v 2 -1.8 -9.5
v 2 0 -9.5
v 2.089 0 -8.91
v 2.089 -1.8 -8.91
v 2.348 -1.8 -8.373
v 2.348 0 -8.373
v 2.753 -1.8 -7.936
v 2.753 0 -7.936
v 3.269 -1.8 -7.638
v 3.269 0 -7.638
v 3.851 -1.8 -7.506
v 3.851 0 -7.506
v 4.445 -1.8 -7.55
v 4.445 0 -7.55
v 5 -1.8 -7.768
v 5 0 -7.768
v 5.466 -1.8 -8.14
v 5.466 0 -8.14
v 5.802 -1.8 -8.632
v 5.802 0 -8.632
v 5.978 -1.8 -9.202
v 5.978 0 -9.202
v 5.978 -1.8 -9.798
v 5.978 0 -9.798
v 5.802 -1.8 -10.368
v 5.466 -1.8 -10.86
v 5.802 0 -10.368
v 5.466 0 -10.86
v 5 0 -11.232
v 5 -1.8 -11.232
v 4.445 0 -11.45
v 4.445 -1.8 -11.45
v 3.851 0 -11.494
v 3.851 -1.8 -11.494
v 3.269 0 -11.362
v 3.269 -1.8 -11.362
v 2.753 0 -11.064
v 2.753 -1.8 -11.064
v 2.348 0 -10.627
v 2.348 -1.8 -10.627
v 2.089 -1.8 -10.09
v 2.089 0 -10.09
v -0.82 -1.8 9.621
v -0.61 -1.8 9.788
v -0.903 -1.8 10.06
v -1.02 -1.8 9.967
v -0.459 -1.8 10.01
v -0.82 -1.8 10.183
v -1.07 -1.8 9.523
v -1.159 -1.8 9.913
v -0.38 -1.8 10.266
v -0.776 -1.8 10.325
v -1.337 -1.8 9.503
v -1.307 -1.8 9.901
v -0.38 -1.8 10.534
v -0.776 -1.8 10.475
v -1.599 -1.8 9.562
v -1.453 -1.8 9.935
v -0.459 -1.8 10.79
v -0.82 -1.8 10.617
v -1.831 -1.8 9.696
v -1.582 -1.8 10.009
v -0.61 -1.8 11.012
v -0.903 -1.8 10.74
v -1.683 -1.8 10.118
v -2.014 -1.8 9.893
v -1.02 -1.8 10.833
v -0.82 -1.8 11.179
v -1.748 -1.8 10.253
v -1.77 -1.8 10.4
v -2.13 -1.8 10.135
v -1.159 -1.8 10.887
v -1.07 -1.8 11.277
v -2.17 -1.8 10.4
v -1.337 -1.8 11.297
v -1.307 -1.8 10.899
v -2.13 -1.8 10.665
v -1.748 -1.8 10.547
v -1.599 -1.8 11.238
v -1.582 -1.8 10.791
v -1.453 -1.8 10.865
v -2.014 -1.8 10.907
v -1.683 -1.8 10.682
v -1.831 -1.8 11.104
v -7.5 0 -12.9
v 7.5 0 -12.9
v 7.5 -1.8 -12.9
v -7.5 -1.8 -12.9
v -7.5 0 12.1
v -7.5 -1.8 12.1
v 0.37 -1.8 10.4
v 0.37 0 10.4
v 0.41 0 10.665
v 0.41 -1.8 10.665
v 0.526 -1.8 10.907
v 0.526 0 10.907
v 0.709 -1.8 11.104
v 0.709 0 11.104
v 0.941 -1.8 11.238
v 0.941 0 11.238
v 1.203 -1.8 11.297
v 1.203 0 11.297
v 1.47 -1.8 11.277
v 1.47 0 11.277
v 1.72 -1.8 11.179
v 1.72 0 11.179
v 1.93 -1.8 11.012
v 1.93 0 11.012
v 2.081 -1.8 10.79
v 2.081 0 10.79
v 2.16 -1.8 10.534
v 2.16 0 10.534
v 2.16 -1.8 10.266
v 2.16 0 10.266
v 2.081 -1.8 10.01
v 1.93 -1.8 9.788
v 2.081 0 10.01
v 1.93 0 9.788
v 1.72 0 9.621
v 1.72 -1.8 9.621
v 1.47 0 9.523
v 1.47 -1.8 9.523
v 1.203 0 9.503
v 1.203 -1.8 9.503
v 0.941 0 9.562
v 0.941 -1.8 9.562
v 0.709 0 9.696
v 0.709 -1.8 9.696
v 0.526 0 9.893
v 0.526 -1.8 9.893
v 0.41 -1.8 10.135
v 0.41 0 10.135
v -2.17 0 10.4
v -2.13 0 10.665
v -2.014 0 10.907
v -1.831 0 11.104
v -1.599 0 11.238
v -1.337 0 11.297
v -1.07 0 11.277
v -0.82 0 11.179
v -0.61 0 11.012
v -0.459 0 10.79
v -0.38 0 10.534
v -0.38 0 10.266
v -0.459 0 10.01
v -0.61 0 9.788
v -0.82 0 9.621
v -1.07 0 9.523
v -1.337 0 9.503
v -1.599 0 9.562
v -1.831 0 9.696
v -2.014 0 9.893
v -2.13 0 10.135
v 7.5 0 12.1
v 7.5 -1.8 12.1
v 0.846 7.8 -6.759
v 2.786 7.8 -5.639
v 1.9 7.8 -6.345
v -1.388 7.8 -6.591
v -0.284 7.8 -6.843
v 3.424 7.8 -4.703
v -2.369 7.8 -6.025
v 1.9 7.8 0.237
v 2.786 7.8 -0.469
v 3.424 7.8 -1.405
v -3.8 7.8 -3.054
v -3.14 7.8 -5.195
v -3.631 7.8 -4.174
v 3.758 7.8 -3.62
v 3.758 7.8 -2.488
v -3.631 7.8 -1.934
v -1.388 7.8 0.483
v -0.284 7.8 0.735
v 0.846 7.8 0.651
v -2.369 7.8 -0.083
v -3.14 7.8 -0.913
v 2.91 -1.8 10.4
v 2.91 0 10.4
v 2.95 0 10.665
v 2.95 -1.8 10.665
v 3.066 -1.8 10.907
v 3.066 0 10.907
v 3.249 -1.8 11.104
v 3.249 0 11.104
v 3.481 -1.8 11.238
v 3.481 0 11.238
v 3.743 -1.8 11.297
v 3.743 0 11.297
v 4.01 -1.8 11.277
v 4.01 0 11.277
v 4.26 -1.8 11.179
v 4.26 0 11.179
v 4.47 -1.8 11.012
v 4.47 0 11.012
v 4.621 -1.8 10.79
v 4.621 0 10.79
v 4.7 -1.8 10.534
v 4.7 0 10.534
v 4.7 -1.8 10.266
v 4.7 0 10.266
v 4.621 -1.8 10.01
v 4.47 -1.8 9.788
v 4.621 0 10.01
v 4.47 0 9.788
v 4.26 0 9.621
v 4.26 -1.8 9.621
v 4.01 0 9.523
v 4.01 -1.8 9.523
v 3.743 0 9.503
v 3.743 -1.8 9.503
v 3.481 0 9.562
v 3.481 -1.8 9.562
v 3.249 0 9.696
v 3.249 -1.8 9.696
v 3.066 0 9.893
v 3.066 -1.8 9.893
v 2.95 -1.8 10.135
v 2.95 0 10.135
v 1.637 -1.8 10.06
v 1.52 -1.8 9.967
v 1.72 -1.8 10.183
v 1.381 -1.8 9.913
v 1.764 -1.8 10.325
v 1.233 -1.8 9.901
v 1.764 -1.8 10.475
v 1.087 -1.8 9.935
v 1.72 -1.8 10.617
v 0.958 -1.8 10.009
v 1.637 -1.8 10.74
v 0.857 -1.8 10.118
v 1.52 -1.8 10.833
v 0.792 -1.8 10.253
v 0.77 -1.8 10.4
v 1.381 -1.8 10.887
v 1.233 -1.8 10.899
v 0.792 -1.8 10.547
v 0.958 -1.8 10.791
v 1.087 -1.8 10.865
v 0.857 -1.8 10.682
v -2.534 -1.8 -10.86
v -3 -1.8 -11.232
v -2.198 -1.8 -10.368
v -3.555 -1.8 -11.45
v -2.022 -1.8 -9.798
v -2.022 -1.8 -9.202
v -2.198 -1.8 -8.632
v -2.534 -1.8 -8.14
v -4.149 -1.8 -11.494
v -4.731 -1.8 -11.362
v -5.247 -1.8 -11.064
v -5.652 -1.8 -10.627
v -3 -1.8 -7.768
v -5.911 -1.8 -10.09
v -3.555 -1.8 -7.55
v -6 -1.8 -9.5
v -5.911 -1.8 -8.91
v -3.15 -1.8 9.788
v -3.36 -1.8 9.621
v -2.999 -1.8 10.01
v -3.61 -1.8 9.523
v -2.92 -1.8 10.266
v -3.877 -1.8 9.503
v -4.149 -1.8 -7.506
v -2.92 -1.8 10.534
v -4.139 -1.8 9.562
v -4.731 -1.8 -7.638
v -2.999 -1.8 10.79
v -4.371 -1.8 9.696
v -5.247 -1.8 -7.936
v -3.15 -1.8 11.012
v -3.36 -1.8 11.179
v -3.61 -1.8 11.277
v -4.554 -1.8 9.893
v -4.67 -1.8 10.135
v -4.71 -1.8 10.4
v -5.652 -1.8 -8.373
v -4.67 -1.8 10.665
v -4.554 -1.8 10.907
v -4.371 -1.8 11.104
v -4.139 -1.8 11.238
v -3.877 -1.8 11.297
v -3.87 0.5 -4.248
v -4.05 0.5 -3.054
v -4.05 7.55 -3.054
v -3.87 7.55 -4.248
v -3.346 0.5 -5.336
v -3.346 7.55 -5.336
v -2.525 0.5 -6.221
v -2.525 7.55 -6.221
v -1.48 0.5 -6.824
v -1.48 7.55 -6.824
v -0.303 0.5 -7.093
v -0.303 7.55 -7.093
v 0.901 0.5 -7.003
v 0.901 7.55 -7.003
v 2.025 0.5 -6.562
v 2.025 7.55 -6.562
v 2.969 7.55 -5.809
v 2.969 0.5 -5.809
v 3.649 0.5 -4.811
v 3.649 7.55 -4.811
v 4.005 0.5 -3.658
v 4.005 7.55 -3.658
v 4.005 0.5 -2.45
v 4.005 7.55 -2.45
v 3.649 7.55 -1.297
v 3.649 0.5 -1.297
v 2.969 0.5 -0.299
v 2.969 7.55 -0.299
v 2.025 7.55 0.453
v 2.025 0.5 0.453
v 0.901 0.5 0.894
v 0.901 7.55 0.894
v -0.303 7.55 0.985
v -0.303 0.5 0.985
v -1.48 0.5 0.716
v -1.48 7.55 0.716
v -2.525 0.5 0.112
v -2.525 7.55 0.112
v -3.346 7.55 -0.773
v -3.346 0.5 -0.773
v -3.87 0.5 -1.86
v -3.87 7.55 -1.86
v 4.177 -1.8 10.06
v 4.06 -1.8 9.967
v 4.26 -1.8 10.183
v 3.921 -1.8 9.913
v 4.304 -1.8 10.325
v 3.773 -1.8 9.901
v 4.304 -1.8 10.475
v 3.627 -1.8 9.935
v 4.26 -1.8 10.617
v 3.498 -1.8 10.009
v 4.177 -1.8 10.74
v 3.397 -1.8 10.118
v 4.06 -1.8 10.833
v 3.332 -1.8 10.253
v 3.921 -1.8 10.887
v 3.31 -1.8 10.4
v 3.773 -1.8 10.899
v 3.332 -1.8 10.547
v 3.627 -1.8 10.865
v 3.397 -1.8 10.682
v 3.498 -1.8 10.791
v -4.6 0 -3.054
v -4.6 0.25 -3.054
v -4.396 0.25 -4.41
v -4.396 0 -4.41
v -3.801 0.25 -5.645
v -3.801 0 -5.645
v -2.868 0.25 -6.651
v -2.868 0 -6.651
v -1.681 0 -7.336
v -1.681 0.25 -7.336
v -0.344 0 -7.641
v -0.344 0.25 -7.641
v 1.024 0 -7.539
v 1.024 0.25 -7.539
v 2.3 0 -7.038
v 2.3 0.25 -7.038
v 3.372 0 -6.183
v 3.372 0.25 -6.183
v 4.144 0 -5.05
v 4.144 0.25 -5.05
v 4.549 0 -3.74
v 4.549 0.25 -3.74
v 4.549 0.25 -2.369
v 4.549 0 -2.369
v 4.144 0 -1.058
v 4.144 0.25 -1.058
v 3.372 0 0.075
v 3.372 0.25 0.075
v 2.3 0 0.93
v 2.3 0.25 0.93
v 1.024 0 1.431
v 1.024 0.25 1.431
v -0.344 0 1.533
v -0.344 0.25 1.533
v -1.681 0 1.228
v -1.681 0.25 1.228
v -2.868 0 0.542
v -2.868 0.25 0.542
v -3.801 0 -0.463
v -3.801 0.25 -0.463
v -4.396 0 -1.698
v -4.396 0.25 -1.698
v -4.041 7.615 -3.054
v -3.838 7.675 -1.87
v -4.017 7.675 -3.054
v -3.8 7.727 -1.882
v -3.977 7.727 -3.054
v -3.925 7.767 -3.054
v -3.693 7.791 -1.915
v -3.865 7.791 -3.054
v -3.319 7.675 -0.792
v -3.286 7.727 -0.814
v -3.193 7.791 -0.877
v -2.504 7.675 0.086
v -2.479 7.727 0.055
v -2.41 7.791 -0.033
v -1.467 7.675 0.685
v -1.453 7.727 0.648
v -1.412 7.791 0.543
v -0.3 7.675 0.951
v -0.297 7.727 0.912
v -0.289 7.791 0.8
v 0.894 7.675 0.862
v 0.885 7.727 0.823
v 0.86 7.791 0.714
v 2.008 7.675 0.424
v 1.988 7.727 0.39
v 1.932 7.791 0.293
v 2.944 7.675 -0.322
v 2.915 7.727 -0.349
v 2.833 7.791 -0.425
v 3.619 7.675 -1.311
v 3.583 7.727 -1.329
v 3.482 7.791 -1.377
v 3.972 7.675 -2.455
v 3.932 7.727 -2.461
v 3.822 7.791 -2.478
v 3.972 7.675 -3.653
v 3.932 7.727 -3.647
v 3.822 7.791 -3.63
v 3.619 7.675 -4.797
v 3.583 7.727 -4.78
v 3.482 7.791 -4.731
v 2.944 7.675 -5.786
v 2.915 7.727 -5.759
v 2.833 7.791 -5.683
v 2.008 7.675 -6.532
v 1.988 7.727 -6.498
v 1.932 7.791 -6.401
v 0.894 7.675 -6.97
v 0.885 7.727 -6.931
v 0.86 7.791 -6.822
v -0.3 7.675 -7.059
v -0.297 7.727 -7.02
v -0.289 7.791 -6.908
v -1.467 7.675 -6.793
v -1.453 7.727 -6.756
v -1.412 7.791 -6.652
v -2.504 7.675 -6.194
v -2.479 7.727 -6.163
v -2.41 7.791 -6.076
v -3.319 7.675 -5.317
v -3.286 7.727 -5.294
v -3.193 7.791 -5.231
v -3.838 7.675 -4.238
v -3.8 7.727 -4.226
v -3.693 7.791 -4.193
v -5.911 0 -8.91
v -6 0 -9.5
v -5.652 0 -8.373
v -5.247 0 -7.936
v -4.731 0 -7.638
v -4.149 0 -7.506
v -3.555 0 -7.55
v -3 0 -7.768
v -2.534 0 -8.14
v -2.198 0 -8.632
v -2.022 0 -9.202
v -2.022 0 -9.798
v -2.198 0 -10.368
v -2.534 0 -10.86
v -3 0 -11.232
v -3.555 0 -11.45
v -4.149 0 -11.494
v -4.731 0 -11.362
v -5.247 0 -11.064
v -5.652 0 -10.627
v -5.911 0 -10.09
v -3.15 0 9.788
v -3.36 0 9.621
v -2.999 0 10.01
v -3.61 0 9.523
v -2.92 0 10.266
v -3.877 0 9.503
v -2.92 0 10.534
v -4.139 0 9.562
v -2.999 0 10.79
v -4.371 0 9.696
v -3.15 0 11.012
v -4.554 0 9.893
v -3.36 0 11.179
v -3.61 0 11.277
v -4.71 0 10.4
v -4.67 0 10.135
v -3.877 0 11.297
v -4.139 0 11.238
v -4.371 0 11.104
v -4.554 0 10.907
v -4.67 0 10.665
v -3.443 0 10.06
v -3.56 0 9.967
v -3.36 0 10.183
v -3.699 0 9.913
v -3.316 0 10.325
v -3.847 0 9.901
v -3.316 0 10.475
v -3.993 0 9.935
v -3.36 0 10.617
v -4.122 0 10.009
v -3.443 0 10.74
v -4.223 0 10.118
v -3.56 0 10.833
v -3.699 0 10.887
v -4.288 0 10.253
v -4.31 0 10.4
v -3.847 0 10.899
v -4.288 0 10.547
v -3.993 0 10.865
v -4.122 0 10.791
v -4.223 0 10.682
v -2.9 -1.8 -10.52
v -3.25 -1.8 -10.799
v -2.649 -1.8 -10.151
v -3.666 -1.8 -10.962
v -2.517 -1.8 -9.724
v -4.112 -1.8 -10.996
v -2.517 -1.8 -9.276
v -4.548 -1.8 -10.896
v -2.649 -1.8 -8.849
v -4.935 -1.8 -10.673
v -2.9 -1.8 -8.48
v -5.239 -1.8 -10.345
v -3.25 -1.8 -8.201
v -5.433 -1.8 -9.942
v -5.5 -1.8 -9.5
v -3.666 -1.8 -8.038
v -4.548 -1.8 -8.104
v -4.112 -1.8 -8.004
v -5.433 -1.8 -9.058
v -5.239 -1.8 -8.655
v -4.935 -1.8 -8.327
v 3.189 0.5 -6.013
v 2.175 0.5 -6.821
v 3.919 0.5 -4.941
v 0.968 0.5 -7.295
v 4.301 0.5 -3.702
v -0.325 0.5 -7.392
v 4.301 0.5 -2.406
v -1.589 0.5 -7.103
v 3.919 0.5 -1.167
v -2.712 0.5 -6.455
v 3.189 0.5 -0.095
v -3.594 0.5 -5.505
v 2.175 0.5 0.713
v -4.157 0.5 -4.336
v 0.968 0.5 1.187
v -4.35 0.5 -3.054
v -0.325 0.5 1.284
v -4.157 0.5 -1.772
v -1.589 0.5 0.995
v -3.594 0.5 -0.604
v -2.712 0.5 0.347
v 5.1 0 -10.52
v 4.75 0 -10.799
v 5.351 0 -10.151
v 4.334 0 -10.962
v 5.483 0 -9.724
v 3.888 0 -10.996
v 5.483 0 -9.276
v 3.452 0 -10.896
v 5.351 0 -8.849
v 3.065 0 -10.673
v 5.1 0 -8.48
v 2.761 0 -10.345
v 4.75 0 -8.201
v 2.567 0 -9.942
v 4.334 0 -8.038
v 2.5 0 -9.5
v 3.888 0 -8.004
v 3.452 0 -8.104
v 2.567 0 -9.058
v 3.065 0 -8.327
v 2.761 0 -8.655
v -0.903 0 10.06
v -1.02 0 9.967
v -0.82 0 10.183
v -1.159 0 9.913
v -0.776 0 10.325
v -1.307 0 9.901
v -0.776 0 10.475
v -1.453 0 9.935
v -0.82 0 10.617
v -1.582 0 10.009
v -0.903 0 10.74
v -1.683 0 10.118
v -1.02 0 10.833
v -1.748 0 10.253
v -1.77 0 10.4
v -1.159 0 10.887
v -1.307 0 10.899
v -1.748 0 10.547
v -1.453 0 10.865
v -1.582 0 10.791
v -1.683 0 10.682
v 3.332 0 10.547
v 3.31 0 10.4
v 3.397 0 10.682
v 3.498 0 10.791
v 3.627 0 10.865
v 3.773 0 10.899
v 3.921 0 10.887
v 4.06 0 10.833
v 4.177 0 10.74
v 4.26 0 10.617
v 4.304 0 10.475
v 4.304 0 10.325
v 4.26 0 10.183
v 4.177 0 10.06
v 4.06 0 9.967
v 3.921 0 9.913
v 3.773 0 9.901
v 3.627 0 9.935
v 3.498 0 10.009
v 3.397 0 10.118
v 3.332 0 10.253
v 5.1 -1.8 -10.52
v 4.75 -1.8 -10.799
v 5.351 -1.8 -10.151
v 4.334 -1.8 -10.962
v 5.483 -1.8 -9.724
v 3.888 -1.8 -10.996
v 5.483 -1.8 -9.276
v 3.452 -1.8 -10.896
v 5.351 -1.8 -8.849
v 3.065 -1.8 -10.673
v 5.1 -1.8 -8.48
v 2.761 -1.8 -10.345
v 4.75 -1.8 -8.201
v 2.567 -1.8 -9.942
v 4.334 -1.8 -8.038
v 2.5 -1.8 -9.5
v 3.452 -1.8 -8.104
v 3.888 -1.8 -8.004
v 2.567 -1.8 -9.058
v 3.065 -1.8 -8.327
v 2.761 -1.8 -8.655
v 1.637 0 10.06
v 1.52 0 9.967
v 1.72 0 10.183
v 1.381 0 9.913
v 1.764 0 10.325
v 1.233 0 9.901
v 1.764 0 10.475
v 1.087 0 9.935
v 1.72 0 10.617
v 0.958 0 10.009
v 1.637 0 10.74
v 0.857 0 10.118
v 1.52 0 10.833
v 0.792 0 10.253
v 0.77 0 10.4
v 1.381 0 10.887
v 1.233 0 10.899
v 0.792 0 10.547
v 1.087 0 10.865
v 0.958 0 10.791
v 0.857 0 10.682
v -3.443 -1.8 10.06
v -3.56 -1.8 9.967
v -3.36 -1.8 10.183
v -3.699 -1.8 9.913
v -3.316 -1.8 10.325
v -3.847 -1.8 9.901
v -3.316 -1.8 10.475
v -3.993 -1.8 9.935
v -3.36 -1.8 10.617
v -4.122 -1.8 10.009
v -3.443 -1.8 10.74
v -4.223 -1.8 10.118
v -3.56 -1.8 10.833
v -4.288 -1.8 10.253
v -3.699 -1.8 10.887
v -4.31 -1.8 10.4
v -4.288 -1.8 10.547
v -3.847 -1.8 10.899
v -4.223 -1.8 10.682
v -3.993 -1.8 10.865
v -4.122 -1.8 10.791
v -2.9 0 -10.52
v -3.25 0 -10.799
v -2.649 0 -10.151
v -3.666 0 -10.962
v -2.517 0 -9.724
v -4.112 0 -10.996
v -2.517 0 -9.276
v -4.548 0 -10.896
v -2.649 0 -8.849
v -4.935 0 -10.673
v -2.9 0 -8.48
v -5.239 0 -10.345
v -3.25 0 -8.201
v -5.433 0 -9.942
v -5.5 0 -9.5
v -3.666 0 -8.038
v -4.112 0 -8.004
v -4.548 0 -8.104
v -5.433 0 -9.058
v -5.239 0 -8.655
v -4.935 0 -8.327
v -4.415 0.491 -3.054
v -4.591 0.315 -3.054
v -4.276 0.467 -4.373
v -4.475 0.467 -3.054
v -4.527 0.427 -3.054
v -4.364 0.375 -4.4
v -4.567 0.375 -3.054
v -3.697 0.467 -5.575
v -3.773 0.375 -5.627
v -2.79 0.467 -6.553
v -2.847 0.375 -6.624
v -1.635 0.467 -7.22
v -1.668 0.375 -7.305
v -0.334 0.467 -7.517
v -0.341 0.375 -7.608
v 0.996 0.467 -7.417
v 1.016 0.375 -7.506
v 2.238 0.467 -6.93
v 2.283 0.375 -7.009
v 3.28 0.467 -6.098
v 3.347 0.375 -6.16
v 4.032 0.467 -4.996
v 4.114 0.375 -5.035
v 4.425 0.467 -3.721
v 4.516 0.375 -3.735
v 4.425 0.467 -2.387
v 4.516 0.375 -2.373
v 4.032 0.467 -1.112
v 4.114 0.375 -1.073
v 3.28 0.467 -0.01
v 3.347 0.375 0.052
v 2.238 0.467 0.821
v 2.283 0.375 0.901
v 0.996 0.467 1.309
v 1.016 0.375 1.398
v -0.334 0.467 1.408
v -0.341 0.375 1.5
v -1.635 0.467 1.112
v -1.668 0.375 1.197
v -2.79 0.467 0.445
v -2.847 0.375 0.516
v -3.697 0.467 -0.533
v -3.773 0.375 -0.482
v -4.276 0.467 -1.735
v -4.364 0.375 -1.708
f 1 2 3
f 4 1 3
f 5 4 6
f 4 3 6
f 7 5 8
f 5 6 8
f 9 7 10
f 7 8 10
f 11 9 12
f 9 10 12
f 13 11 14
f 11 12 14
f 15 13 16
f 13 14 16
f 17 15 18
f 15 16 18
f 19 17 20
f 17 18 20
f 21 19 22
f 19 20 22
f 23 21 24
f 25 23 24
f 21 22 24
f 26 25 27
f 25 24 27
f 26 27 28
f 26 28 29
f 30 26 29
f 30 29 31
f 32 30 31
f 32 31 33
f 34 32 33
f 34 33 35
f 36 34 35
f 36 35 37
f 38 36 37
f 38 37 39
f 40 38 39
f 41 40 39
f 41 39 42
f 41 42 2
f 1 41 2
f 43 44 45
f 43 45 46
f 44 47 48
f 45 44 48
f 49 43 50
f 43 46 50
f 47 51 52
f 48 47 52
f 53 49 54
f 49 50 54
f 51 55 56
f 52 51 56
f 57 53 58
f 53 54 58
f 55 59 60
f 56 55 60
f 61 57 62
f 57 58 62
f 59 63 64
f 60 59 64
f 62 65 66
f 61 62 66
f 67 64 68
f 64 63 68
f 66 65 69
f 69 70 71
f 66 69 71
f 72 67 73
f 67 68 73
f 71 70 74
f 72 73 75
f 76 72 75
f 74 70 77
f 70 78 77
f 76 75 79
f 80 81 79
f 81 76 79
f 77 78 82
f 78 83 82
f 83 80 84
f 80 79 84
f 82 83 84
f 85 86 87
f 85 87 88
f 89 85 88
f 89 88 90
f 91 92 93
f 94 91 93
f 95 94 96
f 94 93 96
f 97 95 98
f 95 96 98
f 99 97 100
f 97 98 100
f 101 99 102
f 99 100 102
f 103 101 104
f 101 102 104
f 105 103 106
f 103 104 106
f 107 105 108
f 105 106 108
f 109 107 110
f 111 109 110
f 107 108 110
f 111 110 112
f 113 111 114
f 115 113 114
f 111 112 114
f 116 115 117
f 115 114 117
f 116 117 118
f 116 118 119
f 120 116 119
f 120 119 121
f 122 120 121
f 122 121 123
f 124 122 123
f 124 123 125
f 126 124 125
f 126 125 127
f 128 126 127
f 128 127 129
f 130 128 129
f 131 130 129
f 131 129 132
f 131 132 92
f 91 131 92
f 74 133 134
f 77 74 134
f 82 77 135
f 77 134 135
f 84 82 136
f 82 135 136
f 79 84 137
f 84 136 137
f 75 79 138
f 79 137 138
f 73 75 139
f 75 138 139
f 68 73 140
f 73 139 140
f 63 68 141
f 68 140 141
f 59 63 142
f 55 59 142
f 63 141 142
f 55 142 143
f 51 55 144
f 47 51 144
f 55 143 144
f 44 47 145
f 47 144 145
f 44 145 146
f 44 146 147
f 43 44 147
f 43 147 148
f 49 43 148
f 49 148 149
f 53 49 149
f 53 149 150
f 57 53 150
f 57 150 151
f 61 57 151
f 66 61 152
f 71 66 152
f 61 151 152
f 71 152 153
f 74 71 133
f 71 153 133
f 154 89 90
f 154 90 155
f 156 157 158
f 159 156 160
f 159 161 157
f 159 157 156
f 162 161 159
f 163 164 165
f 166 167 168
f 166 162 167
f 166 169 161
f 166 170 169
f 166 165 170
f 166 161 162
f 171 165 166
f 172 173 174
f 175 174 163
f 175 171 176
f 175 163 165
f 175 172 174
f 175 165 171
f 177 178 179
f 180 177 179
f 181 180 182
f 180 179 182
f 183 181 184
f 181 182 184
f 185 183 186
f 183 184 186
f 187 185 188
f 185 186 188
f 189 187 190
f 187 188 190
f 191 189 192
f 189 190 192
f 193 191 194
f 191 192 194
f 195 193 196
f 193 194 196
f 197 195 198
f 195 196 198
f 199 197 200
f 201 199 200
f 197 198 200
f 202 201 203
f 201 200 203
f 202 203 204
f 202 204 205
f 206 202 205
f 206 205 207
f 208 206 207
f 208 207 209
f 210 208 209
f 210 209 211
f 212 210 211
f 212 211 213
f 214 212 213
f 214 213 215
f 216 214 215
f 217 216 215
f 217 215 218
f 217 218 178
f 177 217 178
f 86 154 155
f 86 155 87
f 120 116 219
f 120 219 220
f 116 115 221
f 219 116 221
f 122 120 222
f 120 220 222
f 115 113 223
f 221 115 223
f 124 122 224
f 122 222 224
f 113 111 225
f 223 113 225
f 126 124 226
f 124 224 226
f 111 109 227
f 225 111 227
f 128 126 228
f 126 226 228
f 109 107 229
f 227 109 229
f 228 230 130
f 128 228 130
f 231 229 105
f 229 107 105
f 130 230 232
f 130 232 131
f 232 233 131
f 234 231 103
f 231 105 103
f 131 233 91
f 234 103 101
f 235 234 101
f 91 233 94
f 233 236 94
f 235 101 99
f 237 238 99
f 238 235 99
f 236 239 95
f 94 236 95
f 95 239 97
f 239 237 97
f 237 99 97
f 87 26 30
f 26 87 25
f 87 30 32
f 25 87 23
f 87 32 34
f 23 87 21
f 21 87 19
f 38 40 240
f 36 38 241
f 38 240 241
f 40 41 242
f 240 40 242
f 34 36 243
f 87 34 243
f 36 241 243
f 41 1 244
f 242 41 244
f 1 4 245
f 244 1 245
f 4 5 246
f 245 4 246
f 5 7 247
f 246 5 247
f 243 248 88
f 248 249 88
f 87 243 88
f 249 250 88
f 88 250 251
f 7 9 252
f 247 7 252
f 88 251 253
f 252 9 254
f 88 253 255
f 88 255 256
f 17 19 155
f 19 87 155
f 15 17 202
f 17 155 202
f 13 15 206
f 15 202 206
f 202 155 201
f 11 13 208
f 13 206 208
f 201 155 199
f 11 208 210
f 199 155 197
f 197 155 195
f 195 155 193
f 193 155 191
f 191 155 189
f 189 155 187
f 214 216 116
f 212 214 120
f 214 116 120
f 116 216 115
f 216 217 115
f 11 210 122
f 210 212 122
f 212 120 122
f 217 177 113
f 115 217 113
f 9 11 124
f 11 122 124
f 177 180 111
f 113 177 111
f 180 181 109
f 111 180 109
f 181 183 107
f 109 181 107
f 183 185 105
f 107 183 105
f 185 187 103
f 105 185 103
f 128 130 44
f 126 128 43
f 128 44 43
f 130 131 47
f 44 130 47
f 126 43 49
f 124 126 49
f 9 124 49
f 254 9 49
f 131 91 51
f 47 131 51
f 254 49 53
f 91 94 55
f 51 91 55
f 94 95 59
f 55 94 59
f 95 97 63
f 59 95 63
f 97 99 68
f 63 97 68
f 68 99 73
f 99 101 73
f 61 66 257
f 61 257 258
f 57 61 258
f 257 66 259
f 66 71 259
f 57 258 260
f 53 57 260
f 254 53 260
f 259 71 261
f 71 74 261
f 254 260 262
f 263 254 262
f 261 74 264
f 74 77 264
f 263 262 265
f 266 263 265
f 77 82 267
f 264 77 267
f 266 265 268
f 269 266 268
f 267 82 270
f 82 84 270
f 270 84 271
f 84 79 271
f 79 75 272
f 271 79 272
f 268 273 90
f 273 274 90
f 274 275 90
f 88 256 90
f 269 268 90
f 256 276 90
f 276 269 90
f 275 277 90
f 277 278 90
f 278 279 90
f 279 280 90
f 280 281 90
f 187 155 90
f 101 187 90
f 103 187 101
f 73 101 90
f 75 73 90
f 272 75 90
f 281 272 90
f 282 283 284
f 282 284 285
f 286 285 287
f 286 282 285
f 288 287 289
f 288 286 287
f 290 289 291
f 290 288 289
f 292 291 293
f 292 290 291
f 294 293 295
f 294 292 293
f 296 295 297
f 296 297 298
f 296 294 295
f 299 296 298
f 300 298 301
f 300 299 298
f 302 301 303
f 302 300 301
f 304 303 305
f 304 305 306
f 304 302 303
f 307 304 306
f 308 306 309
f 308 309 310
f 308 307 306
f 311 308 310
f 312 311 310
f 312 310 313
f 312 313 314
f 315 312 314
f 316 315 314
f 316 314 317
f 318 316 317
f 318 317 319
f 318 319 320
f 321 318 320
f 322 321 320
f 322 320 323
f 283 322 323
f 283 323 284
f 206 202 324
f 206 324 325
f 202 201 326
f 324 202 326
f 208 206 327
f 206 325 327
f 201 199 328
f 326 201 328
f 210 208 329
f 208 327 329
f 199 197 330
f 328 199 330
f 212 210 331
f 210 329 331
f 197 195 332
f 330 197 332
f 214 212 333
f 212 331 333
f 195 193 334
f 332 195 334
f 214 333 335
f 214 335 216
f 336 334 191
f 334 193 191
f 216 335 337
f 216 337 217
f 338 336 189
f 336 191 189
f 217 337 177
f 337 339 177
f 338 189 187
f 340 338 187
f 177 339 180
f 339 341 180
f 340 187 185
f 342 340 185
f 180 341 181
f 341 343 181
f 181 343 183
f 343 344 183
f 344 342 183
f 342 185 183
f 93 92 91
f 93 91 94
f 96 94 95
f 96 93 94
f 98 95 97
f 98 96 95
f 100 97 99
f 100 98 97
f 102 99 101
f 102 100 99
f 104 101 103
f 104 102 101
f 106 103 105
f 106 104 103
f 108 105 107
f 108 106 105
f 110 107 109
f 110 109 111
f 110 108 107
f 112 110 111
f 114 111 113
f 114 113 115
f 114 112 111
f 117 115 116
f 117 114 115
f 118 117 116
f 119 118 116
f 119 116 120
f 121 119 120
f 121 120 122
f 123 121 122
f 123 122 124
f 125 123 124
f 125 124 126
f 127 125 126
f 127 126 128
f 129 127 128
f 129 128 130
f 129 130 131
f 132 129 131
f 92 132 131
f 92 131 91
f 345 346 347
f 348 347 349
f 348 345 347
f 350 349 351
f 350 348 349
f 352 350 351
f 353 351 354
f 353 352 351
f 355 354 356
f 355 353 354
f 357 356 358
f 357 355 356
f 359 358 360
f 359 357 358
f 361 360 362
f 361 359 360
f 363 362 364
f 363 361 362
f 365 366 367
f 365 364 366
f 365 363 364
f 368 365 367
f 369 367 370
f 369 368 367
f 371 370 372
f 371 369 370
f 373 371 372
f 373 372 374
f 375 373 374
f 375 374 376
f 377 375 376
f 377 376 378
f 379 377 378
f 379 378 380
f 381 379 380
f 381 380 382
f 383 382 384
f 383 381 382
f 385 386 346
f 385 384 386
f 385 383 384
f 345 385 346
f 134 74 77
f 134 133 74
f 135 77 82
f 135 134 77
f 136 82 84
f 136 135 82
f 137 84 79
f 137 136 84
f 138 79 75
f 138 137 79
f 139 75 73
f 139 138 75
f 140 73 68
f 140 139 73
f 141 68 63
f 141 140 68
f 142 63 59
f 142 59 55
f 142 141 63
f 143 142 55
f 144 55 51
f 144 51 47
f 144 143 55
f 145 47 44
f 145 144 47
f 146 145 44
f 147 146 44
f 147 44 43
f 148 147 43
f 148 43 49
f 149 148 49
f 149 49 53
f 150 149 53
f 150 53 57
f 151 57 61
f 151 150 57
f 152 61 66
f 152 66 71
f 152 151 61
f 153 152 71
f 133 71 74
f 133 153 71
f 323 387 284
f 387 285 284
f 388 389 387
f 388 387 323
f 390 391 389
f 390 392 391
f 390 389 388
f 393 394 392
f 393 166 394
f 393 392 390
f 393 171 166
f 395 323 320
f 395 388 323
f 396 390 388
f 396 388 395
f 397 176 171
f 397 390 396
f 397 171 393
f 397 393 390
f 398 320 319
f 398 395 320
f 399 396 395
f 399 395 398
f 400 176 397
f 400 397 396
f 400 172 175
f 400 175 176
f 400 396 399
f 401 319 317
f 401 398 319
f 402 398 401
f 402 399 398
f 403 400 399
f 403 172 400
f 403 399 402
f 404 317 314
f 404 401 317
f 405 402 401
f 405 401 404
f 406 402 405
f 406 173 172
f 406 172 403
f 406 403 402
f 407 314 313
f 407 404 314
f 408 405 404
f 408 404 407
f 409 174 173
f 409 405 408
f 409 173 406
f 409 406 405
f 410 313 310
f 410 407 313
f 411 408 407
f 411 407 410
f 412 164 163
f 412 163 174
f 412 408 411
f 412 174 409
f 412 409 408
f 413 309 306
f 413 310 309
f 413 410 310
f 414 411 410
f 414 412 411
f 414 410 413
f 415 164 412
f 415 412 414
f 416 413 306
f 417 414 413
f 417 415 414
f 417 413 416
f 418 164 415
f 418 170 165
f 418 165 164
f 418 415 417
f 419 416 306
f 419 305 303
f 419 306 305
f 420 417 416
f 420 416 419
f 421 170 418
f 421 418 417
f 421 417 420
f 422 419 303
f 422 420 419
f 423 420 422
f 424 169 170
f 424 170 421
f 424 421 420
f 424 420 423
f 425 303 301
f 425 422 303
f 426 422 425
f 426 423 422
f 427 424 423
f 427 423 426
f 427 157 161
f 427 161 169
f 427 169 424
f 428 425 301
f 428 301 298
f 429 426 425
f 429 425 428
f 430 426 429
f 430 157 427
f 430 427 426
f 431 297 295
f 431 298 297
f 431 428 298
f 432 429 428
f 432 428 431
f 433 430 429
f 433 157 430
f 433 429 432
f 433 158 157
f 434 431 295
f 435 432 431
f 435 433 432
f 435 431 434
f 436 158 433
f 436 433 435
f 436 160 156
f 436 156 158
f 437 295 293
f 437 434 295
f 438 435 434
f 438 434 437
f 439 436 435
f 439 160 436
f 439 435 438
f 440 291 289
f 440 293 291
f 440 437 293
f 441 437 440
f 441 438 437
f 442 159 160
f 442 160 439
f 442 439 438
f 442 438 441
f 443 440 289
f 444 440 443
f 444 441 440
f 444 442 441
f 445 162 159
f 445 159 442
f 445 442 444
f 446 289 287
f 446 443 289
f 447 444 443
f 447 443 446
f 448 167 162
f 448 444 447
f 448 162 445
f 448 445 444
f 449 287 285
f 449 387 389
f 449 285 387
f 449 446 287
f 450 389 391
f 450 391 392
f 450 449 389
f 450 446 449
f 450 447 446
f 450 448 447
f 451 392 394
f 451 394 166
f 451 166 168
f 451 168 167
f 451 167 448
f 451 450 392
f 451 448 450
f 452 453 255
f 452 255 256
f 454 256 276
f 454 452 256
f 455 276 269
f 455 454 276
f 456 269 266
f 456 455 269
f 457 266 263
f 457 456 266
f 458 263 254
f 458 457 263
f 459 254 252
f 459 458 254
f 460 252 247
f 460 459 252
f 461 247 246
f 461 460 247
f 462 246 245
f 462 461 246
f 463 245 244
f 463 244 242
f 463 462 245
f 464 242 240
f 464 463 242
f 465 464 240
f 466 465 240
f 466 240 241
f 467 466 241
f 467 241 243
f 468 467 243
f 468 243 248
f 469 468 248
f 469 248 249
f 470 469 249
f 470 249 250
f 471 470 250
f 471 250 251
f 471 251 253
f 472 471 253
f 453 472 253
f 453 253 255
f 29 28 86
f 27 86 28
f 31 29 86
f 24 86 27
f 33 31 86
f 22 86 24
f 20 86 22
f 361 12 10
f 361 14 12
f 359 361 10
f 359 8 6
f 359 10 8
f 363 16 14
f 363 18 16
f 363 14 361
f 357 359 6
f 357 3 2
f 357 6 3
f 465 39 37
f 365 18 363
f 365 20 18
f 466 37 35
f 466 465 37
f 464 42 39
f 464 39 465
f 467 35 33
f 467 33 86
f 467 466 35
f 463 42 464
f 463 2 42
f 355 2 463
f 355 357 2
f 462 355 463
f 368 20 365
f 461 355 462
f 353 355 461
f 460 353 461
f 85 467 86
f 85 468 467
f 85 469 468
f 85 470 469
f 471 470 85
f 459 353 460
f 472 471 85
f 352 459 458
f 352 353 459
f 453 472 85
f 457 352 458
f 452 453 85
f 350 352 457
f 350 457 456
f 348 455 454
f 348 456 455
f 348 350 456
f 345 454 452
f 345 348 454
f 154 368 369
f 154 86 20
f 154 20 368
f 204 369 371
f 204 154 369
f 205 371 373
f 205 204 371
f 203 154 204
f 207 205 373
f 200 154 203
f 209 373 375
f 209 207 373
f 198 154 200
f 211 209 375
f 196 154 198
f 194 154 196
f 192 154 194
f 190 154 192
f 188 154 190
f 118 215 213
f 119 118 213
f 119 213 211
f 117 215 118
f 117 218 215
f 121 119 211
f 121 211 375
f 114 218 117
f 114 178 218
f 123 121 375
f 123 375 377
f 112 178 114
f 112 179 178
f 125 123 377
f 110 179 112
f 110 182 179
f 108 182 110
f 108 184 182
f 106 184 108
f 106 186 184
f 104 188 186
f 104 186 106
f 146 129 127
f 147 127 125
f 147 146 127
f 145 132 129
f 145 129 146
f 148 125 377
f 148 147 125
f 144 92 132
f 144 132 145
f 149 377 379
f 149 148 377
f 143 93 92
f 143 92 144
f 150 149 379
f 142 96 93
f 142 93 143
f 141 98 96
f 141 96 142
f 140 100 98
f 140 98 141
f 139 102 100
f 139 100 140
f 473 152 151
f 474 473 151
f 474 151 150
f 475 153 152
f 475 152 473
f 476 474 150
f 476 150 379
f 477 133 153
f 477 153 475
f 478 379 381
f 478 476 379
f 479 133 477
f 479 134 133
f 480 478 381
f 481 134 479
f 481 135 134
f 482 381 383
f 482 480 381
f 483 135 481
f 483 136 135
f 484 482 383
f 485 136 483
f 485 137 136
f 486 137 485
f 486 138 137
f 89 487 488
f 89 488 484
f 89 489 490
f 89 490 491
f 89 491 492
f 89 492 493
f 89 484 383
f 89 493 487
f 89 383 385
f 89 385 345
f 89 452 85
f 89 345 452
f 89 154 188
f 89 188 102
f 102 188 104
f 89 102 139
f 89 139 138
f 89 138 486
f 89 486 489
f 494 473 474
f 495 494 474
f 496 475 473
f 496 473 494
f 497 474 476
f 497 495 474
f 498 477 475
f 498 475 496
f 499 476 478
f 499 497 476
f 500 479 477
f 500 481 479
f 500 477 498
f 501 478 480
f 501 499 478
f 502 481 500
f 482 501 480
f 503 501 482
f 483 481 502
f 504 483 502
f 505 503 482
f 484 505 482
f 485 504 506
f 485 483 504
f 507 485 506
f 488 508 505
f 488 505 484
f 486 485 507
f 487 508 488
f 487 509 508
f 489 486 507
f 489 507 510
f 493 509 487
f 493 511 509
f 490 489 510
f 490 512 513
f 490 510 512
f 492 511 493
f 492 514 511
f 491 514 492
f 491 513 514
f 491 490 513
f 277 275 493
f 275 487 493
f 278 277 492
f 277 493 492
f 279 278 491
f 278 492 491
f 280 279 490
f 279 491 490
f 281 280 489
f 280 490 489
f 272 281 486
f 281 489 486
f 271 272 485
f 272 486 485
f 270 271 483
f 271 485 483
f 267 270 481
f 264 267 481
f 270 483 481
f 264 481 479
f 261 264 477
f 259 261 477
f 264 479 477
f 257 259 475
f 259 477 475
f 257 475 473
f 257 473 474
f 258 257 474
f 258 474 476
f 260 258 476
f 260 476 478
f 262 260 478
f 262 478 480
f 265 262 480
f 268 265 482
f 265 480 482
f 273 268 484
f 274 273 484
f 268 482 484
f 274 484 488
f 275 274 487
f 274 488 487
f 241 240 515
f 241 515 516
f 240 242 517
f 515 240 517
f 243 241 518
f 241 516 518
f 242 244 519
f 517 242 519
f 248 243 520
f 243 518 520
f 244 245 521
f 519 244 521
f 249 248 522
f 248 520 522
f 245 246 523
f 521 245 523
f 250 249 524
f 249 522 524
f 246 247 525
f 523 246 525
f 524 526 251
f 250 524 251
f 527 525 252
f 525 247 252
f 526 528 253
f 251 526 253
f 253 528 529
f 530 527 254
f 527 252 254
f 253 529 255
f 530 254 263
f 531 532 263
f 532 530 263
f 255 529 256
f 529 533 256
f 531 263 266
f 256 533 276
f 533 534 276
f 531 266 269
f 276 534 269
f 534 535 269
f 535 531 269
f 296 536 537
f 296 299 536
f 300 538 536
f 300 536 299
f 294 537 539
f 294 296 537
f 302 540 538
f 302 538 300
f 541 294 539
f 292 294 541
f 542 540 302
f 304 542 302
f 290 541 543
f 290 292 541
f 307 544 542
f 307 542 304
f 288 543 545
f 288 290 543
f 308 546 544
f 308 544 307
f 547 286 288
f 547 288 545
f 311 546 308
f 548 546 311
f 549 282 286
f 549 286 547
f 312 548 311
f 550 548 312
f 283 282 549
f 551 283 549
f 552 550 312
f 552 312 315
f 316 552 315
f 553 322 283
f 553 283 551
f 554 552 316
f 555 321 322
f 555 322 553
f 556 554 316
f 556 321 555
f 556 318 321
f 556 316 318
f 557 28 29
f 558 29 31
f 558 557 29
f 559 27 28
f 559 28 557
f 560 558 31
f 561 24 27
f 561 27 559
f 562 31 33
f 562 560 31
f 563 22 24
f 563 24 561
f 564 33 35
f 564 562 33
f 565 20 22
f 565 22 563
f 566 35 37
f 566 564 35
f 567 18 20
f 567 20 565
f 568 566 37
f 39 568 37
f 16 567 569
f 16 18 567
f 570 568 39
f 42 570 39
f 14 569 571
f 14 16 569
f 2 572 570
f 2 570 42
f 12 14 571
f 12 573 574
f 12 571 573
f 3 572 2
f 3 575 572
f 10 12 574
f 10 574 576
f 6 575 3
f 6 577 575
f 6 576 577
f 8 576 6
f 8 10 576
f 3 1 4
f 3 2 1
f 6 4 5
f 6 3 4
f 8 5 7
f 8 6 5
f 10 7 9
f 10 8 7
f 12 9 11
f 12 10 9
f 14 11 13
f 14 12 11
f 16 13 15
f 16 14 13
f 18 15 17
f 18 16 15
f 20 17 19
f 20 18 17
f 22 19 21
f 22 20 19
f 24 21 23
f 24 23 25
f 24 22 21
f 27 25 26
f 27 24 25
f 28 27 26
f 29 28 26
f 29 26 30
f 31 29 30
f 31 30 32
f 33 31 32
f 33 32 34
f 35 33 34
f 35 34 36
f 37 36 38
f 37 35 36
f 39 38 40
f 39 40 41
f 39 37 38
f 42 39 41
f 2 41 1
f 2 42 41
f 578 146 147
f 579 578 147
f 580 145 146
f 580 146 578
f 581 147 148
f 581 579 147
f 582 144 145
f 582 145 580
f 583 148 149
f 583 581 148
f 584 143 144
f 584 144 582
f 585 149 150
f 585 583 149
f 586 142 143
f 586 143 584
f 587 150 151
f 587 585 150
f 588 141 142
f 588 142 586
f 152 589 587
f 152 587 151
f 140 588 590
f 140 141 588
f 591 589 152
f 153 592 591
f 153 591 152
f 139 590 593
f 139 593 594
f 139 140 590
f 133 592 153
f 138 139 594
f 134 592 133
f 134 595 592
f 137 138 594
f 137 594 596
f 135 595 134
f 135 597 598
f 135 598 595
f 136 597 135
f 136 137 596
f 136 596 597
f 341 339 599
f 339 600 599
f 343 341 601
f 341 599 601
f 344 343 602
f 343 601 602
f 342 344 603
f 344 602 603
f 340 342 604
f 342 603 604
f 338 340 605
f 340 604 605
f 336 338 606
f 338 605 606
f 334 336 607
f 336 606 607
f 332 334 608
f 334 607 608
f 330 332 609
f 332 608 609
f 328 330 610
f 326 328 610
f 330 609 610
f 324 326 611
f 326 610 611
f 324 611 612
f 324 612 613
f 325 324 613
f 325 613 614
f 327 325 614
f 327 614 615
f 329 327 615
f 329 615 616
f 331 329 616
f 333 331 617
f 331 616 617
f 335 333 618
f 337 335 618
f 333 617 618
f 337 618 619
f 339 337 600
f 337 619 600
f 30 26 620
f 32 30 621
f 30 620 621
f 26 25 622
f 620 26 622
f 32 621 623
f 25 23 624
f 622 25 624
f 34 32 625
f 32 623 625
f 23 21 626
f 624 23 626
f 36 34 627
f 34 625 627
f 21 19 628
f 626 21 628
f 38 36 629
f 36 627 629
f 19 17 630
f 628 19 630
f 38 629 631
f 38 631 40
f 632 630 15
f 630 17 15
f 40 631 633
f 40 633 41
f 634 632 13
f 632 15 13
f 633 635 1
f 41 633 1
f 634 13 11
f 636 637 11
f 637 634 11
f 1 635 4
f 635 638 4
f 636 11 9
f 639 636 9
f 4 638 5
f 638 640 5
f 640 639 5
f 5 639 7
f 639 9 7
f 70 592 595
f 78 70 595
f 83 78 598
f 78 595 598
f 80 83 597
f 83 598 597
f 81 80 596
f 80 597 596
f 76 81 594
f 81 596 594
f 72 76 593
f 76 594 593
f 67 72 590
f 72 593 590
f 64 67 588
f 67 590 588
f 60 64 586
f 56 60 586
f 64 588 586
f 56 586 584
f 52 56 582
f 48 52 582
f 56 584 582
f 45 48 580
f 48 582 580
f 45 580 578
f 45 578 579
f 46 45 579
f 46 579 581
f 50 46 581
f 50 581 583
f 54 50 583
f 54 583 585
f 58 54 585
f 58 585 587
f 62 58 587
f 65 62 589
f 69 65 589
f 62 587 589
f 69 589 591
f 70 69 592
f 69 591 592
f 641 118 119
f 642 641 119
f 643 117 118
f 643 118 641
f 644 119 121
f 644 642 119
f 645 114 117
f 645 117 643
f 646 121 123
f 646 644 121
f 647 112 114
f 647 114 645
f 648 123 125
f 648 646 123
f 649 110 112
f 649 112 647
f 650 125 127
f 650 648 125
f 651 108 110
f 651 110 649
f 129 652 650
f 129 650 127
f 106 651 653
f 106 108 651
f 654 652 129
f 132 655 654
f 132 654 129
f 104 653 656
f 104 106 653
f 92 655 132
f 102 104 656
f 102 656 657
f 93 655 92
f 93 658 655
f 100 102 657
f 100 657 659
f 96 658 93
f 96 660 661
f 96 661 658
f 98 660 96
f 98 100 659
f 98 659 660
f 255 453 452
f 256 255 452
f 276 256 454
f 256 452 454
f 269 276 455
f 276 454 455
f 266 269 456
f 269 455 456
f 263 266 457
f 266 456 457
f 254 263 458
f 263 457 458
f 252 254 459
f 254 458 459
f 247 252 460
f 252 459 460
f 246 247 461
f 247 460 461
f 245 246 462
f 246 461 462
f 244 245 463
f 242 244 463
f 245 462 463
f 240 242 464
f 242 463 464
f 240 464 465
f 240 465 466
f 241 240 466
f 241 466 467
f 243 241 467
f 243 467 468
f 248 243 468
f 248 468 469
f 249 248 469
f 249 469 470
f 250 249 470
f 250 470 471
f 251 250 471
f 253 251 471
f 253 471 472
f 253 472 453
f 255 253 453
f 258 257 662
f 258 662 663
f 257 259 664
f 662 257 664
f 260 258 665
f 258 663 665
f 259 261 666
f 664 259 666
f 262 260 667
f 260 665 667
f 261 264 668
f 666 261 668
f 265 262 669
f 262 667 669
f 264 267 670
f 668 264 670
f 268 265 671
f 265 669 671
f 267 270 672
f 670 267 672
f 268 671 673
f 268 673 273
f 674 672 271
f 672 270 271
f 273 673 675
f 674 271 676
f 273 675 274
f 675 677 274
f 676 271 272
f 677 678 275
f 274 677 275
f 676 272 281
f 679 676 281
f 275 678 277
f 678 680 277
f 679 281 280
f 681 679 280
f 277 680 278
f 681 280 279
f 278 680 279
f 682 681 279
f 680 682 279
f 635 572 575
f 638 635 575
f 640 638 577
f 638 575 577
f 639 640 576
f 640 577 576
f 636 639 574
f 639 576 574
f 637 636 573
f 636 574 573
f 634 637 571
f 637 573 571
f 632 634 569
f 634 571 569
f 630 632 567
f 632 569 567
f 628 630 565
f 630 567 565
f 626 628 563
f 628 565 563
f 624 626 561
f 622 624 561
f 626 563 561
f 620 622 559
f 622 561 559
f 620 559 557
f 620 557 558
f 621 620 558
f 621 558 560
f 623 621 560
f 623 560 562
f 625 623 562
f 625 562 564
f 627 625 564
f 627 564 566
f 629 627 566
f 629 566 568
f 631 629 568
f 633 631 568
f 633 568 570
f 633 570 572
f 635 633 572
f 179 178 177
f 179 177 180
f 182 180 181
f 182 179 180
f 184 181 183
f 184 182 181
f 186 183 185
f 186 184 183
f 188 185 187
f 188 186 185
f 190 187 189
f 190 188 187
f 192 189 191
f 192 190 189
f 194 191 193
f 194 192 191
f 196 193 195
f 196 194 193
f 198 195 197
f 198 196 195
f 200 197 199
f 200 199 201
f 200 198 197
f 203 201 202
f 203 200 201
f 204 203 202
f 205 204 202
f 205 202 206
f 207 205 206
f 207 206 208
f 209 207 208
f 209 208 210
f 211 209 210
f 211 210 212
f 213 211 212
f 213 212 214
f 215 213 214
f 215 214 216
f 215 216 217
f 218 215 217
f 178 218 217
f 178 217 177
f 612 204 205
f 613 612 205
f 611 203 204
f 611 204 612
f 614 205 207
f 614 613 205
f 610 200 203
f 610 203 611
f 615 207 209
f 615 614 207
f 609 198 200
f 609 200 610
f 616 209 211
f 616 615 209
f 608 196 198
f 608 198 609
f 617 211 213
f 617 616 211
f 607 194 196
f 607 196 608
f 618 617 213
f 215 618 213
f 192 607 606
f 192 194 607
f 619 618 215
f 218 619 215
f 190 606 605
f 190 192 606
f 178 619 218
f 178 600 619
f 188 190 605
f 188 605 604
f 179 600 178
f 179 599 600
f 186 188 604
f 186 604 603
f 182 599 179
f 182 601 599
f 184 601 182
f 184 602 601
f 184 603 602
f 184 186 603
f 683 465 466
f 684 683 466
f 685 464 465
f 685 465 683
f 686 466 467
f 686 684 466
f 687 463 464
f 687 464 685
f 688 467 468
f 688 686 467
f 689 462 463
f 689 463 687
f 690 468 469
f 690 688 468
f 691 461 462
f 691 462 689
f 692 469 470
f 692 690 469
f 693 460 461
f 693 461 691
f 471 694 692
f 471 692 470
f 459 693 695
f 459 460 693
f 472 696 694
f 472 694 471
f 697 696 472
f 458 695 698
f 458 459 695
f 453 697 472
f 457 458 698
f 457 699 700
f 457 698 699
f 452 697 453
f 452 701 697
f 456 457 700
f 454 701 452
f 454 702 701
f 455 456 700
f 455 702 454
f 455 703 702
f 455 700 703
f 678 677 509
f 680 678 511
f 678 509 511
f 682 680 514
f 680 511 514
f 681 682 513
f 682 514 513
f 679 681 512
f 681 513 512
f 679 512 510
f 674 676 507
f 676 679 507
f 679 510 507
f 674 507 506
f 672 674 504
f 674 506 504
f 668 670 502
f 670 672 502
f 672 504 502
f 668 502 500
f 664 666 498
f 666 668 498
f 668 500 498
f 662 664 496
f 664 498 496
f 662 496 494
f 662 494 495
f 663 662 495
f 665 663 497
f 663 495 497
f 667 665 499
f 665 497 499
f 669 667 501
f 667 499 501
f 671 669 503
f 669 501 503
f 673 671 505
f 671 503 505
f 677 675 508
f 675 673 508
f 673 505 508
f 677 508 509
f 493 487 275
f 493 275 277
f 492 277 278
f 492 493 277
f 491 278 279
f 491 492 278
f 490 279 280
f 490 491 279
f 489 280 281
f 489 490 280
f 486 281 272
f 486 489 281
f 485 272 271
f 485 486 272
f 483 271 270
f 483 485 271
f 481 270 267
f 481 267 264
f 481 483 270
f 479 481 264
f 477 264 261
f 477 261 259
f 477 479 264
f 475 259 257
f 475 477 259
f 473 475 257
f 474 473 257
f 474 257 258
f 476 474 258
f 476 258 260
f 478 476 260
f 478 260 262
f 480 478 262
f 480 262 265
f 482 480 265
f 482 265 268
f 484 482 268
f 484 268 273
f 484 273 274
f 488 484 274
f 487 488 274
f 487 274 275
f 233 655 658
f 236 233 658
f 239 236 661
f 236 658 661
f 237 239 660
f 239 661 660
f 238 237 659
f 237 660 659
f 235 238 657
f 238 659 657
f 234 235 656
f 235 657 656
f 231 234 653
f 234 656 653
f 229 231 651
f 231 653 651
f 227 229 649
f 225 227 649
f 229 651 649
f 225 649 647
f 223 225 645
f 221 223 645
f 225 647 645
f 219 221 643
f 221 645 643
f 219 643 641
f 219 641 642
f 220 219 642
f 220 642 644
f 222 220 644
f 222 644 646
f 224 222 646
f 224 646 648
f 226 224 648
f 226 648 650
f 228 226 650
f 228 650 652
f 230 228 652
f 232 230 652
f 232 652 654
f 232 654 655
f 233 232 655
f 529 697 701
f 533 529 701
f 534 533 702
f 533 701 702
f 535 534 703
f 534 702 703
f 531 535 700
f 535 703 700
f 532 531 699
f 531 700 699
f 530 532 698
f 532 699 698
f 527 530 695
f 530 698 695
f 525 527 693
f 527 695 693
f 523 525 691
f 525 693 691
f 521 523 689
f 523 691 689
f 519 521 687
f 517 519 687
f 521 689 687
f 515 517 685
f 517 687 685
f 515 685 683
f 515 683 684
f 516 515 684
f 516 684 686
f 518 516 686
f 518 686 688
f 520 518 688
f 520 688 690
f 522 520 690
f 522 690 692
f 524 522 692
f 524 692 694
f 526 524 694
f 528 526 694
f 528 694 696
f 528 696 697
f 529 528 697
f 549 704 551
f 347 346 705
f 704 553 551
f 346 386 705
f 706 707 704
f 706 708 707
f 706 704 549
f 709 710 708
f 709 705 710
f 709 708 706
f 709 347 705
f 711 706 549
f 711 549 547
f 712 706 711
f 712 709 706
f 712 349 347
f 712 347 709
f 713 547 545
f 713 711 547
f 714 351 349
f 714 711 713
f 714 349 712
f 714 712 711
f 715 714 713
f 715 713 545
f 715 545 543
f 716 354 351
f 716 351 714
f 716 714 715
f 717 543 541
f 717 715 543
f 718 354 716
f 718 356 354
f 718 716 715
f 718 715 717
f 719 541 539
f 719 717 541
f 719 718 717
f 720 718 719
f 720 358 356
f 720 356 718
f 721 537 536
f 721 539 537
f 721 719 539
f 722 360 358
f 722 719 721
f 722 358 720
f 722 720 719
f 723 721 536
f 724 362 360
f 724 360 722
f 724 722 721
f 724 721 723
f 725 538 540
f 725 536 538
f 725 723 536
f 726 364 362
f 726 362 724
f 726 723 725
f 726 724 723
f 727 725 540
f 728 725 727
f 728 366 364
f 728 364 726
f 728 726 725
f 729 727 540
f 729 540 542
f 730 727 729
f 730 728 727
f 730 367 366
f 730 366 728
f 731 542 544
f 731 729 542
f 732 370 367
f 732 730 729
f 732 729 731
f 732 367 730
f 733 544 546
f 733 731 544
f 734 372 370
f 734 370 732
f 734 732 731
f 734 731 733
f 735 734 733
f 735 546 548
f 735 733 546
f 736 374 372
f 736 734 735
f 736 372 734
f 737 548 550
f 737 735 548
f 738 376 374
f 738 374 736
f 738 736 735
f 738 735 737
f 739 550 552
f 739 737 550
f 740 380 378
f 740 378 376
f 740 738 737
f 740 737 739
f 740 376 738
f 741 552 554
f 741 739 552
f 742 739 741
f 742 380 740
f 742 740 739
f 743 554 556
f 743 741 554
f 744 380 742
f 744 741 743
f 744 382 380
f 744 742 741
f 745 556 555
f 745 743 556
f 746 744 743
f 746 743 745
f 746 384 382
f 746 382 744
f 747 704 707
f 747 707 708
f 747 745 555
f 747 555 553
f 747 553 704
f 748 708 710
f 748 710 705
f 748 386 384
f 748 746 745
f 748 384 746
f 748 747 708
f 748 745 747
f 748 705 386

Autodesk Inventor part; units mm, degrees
ref_plane "YZ Plane" through (0, 0, 0) normal (1, 0, 0) x (0, 1, 0)
ref_plane "XZ Plane" through (0, 0, 0) normal (0, 1, 0) x (-1, 0, 0)
ref_plane "XY Plane" through (0, 0, 0) normal (0, 0, 1) x (1, 0, 0)
sketch "Sketch1" plane through (0, 0, 0) normal (0, 1, 0) x (-1, 0, 0)
  line L0 (7.5, 12.1) -> (-7.5, 12.1)
  line L1 (-7.5, 12.1) -> (-7.5, -12.9)
  line L2 (-7.5, -12.9) -> (7.5, -12.9)
  line L3 (7.5, -12.9) -> (7.5, 12.1)
  circle A0 centre (0, -3.0541) radius 4.05
  circle A1 centre (0, -3.0541) radius 4.6
  circle A2 centre (4, -9.5) radius 1.5
  line L4 (7.5, -12.9) -> (4, -12.9)
  circle A3 centre (-4, -9.5) radius 1.5
  circle A4 centre (4, -9.5) radius 2
  circle A5 centre (-4, -9.5) radius 2
  line L5 (0, -3.0541) -> (7.5, -3.0541)
  line L6 (7.5, -3.0541) -> (7.5, -12.9)
  line L7 (7.5, -12.9) -> (0, -12.9)
  line L8 (0, -12.9) -> (0, -3.0541)
  line L9 (8.662, 14.258) -> (8.662, -14.1579) construction
  line L10 (8.662, -14.1579) -> (-25.9569, -14.1579) construction
  line L11 (-25.9569, -14.1579) -> (-25.9569, 14.258) construction
  line L12 (-25.9569, 14.258) -> (8.662, 14.258) construction
  line L13 (0, -3.0541) -> (0, 12.1)
  line L14 (0, 12.1) -> (0, 10.4)
  line L15 (0, 10.4) -> (1.27, 10.4)
  line L16 (1.27, 10.4) -> (3.81, 10.4)
  line L17 (0, 10.4) -> (-1.27, 10.4)
  line L18 (-1.27, 10.4) -> (-3.81, 10.4)
  circle A6 centre (1.27, 10.4) radius 0.5
  circle A7 centre (3.81, 10.4) radius 0.5
  circle A8 centre (3.81, 10.4) radius 0.9
  circle A9 centre (1.27, 10.4) radius 0.9
  circle A10 centre (-1.27, 10.4) radius 0.9
  circle A11 centre (-3.81, 10.4) radius 0.9
  circle A12 centre (-1.27, 10.4) radius 0.5
  circle A13 centre (-3.81, 10.4) radius 0.5
  point P0 (0, 0)
  dimension "d0" = 15
  dimension "d1" = 25
  dimension "d64" = 8.1
  dimension "d68" = 9.2
  dimension "d73" = 3
  dimension "d83" = 3
  dimension "d99" = 0.5
  dimension "d100" = 0.5
  dimension "d113" = 9.846
  dimension "d114" = 3.5
  dimension "d115" = 3.4
  dimension "d143" = 1.7
  dimension "d144" = 1.27
  dimension "d145" = 2.54
  dimension "d146" = 1.27
  dimension "d147" = 2.54
  dimension "d148" = 1
  dimension "d149" = 1
  dimension "d150" = 1.8
  dimension "d151" = 1.8
  dimension "d152" = 1.8
  dimension "d153" = 1.8
  dimension "d154" = 1
  dimension "d155" = 1
extrude "Extrusion1" add sketch "Sketch1" against normal blind 1.8 contours L3 L5 A1 L13 L0 | L13 A1 L8 L2 L1 L0 | L3 L2 L8 A1 L5 | L5 A0 L13 A1 | A1 L8 A0 L5 | L13 A0 L8 A1 | L5 L13 A0 | A0 L8 L5 | L13 L8 A0 | A2 | A3 | A4 | A5 | A9 L16 A6 L15 | L15 A6 L16 A9 | A6 L16 L15 | L15 L16 A6 | A10 L18 A12 L17 | L17 A12 L18 A10 | A12 L18 L17 | L17 L18 A12 | A7 | A8 | A11 | A13
extrude "Extrusion2" cut sketch "Sketch1" against normal through all contours A2 | A3 | A4 | A5
extrude "Extrusion3" add sketch "Sketch1" against normal blind 1.8 contours A4 | A5
extrude "Extrusion4" add sketch "Sketch1" along normal blind 7.8 contours L5 L13 A0 | A0 L8 L5 | L13 L8 A0
extrude "Extrusion5" add sketch "Sketch1" along normal blind 0.5 contours L5 A0 L13 A1 | A1 L8 A0 L5 | L13 A0 L8 A1
fillet "Fillet1" radius 0.25 1 edges at (4.05, 7.8, -3.0541)
fillet "Fillet2" radius 0.25 1 edges at (4.6, 0.5, -3.0541)
extrude "Extrusion6" cut sketch "Sketch1" against normal blind 10 contours A6 L16 L15 | L15 L16 A6 | A12 L18 L17 | L17 L18 A12 | A7 | A13
extrude "Extrusion7" cut sketch "Sketch1" against normal blind 10 contours A9 L16 A6 L15 | L15 A6 L16 A9 | A10 L18 A12 L17 | L17 A12 L18 A10 | A8 | A11
extrude "Extrusion8" add sketch "Sketch1" against normal up to surface (1.8 mm away) separate body contours A4 | A5 | A9 L16 A6 L15 | L15 A6 L16 A9 | A10 L18 A12 L17 | L17 A12 L18 A10 | A8 | A11
extrude "Extrusion9" cut sketch "Sketch1" against normal through all contours A4 | A5 bodies 1
properties part number "Gas_Sensorsipt"
